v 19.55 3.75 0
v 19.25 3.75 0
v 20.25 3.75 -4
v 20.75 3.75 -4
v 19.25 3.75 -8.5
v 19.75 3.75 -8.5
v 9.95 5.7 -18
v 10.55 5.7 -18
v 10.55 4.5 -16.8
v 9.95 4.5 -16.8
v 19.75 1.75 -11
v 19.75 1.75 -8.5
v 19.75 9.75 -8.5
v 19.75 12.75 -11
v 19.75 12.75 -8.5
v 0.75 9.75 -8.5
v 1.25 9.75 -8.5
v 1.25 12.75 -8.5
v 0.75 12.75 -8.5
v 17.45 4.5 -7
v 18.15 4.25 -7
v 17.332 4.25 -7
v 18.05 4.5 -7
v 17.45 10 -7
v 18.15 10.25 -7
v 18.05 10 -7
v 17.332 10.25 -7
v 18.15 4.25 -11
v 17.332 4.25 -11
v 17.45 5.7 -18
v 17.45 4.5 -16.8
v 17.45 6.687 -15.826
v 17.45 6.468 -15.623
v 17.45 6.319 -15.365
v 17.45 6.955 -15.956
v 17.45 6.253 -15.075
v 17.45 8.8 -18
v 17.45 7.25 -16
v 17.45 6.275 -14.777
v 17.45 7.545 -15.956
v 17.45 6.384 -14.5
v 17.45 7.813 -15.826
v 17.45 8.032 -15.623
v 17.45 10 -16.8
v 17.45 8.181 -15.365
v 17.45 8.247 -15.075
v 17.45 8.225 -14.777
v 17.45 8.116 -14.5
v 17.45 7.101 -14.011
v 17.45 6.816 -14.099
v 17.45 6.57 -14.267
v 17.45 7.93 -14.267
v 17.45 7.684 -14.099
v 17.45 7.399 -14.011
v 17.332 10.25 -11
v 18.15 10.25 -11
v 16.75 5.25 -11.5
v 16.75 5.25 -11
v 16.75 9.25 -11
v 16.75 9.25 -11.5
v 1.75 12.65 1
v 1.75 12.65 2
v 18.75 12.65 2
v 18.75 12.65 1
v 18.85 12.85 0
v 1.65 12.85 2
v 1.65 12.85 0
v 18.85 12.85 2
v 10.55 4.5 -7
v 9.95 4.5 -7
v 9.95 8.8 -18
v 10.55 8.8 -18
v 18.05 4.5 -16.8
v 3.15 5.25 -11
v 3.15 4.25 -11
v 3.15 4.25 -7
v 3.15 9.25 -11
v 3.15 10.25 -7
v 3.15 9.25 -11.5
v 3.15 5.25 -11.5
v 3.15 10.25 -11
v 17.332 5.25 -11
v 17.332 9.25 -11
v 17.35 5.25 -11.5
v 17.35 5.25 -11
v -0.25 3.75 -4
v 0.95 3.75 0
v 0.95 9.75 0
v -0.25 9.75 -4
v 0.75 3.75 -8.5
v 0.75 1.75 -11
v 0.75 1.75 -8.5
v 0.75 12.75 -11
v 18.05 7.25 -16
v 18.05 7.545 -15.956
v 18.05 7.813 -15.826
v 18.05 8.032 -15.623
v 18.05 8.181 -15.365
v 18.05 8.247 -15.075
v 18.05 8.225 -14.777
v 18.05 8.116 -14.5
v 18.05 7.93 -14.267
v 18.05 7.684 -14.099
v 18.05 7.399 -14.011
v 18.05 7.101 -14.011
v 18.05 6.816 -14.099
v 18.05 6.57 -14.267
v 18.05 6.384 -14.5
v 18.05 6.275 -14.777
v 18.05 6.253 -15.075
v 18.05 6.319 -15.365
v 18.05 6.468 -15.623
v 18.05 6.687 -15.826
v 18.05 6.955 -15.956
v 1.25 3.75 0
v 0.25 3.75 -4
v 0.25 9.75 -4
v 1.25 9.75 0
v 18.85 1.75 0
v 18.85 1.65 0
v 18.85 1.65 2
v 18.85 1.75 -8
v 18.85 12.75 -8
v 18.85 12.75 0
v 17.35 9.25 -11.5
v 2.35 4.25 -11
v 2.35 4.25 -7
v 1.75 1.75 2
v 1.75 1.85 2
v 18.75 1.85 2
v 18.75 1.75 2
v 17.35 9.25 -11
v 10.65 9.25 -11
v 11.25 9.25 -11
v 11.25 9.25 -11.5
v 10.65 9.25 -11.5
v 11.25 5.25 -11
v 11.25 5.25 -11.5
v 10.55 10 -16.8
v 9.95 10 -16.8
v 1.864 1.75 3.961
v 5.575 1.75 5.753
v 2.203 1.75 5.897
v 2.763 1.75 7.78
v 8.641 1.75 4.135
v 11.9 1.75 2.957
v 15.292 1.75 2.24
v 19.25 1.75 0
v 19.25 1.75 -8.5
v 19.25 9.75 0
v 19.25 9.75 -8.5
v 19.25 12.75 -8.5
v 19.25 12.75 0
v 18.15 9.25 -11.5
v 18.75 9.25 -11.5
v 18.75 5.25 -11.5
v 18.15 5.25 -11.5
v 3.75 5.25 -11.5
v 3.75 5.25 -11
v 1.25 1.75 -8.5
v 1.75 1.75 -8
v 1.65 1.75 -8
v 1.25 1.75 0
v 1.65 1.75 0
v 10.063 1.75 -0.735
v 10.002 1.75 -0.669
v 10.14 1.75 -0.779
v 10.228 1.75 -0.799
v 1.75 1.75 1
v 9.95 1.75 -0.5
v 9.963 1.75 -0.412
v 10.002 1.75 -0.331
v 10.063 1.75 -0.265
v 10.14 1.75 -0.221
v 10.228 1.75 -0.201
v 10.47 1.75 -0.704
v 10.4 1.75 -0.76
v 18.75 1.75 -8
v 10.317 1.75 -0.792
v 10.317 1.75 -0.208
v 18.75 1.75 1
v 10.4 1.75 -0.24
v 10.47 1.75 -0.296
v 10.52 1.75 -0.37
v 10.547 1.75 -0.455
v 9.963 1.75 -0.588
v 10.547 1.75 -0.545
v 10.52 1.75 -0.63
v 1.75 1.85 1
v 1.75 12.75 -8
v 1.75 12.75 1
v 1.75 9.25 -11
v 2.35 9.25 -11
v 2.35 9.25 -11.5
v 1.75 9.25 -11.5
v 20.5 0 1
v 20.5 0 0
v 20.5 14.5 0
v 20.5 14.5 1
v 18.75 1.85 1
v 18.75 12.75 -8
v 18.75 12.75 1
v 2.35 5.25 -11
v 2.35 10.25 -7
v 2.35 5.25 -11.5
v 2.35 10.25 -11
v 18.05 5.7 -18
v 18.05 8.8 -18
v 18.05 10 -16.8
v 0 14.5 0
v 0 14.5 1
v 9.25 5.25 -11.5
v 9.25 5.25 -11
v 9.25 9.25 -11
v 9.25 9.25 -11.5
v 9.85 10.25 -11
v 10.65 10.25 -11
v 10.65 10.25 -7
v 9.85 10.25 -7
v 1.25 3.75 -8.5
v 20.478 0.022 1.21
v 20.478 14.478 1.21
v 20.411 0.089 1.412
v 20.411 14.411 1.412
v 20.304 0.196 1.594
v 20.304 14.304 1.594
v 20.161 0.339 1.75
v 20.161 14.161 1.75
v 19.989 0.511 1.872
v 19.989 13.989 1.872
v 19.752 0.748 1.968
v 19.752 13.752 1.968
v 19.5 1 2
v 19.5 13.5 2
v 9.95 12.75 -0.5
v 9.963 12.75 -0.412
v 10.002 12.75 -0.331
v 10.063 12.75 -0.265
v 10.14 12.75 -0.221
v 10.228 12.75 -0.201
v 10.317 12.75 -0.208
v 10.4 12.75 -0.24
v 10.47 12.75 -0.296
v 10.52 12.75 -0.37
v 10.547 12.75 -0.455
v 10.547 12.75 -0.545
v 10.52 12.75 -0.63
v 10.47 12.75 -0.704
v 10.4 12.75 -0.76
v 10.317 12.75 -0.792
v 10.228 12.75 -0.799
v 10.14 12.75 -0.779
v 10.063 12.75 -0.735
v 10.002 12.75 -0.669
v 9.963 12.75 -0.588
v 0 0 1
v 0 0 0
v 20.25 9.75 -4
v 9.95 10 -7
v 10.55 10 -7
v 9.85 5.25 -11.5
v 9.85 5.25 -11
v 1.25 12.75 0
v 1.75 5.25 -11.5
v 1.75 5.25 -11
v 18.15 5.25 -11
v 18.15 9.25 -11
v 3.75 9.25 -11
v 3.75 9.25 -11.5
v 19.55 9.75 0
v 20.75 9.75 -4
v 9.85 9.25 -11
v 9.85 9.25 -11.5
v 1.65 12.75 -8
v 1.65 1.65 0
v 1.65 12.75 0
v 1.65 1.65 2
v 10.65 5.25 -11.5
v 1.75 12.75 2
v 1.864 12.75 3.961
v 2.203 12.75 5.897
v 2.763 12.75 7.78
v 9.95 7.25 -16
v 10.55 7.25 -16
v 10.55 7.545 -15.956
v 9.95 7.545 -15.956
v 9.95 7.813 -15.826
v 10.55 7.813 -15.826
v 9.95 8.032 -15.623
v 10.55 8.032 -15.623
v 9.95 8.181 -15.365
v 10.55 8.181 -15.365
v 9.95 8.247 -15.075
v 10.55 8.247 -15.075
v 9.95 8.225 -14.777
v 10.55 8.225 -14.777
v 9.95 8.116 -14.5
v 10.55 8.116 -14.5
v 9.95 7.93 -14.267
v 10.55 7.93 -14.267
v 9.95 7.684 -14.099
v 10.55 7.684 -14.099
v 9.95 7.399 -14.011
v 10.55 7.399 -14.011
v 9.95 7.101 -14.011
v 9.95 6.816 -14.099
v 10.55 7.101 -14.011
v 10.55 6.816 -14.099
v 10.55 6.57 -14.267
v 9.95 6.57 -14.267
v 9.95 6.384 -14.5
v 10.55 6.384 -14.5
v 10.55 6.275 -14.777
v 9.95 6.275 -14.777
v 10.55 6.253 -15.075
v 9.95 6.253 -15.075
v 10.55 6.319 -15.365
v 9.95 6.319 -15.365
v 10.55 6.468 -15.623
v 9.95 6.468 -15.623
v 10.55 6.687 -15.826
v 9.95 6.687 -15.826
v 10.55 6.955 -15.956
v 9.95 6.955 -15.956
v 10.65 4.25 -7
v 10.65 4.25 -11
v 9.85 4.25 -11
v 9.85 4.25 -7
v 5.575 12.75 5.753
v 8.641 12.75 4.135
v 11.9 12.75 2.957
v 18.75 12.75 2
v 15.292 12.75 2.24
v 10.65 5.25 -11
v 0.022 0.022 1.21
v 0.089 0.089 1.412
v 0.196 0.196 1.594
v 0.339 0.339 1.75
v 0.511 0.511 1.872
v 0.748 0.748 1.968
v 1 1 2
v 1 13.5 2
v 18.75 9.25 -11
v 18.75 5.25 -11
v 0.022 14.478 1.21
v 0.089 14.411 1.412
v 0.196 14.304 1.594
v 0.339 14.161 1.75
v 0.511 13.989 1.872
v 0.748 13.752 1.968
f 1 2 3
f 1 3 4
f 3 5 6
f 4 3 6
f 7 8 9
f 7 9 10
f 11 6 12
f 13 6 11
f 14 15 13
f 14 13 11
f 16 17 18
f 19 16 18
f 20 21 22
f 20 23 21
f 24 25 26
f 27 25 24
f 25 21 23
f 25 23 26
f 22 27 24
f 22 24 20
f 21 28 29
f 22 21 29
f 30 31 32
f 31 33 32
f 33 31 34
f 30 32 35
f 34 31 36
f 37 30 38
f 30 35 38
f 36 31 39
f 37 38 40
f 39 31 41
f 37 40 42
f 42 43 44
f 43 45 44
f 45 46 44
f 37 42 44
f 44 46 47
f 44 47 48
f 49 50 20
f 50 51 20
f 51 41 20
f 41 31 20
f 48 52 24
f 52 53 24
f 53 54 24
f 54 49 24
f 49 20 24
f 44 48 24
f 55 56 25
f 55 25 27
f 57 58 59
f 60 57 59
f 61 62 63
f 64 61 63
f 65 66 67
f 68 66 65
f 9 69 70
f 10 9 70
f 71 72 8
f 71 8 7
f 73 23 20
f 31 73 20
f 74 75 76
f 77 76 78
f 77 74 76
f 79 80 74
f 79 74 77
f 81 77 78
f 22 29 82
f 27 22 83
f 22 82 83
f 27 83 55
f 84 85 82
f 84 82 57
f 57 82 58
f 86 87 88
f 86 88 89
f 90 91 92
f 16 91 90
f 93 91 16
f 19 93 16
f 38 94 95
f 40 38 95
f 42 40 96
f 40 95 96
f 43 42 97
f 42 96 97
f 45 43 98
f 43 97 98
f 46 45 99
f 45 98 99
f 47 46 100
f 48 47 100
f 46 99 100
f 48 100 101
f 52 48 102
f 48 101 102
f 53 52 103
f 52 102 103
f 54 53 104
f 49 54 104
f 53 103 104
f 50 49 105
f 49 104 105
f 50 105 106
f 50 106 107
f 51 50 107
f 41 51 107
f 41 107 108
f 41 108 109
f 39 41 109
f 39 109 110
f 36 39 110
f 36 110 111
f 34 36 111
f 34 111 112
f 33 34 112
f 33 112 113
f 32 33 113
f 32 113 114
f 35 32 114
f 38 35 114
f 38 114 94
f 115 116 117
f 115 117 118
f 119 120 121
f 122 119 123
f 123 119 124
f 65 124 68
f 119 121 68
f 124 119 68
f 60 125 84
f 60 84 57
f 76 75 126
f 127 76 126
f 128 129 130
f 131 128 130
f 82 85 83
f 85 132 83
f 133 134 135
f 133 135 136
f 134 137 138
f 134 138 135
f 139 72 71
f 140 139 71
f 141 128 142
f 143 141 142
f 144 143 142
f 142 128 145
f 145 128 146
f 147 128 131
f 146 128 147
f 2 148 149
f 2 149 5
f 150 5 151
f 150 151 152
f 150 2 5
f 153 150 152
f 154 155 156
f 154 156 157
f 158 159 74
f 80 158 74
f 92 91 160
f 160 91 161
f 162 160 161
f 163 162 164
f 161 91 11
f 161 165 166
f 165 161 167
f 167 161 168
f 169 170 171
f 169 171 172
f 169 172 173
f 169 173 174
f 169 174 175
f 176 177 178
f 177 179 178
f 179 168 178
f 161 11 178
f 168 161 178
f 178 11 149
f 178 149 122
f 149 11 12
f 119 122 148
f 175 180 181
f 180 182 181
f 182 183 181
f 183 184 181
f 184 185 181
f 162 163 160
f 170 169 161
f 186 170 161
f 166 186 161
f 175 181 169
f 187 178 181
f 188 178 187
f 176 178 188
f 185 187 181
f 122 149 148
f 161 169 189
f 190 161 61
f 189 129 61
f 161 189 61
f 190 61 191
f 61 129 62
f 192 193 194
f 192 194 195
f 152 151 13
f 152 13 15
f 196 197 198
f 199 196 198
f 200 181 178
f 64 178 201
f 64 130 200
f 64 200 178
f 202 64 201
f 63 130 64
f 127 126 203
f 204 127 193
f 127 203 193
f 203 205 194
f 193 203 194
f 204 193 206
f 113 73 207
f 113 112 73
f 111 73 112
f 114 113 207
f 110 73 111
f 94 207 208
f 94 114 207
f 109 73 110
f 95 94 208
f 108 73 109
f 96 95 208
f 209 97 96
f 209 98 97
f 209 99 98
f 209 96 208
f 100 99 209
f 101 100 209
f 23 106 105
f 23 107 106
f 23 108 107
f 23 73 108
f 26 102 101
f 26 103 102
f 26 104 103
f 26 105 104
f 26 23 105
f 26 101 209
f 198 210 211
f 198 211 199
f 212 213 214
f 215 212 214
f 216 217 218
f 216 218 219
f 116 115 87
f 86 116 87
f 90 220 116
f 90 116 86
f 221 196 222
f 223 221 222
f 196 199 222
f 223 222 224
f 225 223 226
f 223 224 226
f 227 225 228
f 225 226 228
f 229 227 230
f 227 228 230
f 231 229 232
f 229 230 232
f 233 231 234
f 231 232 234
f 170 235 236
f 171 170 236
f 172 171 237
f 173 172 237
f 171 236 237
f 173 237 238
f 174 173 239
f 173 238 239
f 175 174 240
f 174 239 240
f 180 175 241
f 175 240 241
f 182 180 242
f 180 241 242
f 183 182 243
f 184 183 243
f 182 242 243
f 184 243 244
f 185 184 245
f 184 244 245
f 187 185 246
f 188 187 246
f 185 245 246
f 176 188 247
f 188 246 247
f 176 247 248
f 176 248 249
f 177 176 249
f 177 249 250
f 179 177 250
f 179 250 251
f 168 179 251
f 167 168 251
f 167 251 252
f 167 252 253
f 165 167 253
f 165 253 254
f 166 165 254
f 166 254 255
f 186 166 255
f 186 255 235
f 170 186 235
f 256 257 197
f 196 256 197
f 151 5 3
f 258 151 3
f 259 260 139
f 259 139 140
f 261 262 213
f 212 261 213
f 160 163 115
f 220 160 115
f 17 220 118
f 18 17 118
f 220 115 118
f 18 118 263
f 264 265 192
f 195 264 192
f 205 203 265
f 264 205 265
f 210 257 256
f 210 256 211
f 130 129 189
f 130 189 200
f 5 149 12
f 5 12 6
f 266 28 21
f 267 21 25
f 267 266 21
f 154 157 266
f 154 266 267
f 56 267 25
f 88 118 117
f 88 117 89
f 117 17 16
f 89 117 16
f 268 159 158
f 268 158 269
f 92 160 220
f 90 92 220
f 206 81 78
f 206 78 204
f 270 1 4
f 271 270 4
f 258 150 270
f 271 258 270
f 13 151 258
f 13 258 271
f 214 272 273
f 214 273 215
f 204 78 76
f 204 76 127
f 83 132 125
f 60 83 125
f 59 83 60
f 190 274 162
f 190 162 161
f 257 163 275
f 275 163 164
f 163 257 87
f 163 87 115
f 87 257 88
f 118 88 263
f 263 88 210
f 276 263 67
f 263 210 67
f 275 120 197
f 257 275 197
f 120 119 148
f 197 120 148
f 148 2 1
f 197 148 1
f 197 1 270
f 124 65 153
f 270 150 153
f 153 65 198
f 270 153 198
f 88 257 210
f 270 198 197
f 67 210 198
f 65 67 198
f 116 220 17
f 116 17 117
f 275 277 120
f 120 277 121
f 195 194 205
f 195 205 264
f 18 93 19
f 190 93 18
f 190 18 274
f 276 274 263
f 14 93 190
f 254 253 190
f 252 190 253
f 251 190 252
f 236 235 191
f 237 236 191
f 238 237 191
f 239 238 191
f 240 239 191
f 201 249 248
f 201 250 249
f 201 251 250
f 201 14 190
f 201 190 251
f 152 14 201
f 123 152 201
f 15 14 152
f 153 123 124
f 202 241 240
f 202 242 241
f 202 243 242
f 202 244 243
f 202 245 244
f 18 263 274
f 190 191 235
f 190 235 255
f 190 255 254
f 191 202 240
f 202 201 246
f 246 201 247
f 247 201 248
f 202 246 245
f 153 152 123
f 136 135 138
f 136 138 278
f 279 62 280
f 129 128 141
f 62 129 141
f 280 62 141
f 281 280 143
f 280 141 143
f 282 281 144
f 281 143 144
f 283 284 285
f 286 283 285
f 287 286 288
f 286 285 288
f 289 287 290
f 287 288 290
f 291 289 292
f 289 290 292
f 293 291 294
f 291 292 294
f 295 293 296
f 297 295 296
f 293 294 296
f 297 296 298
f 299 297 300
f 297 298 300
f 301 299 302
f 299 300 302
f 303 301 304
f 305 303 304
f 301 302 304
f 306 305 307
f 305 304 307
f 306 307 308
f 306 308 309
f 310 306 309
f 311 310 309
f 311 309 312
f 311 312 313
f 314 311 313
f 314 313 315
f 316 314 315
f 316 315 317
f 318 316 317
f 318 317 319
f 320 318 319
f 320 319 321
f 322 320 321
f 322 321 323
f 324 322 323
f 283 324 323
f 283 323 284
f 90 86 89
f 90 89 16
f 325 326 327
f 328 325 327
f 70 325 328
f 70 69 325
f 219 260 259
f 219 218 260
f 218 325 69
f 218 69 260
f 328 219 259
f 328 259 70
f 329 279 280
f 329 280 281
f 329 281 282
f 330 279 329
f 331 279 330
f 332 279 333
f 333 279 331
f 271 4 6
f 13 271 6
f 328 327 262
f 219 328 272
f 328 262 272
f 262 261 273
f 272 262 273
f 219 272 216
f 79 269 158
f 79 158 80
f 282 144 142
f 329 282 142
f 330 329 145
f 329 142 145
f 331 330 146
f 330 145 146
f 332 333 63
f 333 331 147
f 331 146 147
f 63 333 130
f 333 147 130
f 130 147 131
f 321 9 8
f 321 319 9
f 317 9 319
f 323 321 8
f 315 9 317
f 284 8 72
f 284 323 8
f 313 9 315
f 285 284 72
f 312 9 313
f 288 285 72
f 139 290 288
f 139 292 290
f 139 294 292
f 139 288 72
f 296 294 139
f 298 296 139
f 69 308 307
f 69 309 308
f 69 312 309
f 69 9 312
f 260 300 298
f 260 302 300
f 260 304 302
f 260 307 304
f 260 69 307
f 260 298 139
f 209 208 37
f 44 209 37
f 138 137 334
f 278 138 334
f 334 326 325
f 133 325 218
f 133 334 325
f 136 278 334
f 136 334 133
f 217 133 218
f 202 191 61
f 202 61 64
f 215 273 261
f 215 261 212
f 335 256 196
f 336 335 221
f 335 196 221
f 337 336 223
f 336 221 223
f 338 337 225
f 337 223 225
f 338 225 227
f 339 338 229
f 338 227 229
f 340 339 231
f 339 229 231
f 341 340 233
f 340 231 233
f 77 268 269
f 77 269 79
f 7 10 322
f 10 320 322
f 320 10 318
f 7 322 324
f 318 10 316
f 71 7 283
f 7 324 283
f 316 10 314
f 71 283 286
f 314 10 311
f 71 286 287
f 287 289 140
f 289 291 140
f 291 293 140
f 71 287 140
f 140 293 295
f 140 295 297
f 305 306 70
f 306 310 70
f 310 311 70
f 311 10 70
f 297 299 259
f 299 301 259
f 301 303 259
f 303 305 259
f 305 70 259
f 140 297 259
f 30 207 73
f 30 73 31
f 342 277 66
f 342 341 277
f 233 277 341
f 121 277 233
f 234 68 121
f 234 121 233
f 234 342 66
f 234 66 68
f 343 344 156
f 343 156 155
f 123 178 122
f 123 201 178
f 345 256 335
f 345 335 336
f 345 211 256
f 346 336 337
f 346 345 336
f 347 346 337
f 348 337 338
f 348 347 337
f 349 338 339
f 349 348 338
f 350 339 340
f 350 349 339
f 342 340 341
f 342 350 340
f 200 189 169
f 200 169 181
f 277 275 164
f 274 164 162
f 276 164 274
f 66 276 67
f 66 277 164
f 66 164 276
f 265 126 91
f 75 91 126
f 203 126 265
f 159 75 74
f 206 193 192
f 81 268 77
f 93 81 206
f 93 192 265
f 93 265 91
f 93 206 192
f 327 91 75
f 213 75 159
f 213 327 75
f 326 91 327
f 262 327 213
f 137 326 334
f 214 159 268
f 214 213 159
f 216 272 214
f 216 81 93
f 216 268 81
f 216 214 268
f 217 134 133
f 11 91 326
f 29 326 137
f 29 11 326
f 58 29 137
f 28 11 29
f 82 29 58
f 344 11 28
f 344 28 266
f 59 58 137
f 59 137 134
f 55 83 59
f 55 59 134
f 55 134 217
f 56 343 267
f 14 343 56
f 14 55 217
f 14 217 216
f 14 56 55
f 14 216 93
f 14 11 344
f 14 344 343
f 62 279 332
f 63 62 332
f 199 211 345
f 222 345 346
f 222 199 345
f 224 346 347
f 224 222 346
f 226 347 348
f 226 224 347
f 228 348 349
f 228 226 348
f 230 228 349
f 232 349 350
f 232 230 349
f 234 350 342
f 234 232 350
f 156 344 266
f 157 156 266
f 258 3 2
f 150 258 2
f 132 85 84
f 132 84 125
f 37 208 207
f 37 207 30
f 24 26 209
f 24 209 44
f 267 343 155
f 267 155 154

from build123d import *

# Parameters (mm, degrees)
SKETCH_1_W          = 20.5
SKETCH_1_H          = 14.5
EXTRUDE_1_DEPTH     = 2
FILLET_1_R          = 1
SKETCH_2_W          = 18
SKETCH_2_H          = 11
EXTRUDE_2_DEPTH     = 11
SKETCH_3_W          = 2.5
SKETCH_3_H          = 11
EXTRUDE_3_DEPTH     = 0.5
SKETCH_4_W          = 2.5
SKETCH_4_H          = 11
EXTRUDE_4_DEPTH     = 0.5
SKETCH_5_R          = 0.3
CUT_EXTRUDE_1_DEPTH = 27.529464751
SKETCH_6_W          = 0.6
SKETCH_6_H          = 4
EXTRUDE_5_DEPTH     = 0.5
SKETCH_7_W          = 0.818024616
SKETCH_7_H          = 6
SKETCH_7_W_2        = 0.8
CUT_EXTRUDE_2_DEPTH = 4
SKETCH_8_W          = 0.6
SKETCH_8_H          = 5.5
EXTRUDE_6_DEPTH     = 11
CHAMFER_1_SIZE      = 1.2
SKETCH_9_R          = 1
CUT_EXTRUDE_3_DEPTH = 30.326651701
EXTRUDE_7_DEPTH     = 6
EXTRUDE_8_DEPTH     = 11
SKETCH_12_W         = 17.2
SKETCH_12_H         = 11.2
SKETCH_12_W_2       = 17
SKETCH_12_H_2       = 11
CUT_EXTRUDE_4_DEPTH = 10
SKETCH_13_W         = 17
SKETCH_13_H         = 0.1
CUT_EXTRUDE_5_DEPTH = 1


with BuildPart() as part:
    # 草图1 → 凸台-拉伸1 (new body)
    with BuildSketch(Plane.XY):
        with Locations((10.25, 7.25)):
            Rectangle(SKETCH_1_W, SKETCH_1_H)
    extrude(amount=EXTRUDE_1_DEPTH)

    # 圆角1
    fillet_1_edges = [part.edges().sort_by_distance(p)[0] for p in [
        (20.5, 7.25, 2),
        (10.25, 14.5, 2),
        (0, 7.25, 2),
        (10.25, 0, 2),
    ]]
    fillet(fillet_1_edges, radius=FILLET_1_R)

    # 草图2 → 凸台-拉伸2 (add)
    with BuildSketch(Plane(origin=(0, 0, 0), x_dir=(-1, 0, 0), z_dir=(0, 0, -1))):
        with Locations((-10.25, 7.25)):
            Rectangle(SKETCH_2_W, SKETCH_2_H)
    extrude(amount=EXTRUDE_2_DEPTH)

    # 草图3 → 凸台-拉伸3 (add)
    with BuildSketch(Plane(origin=(19.25, 0, 0), x_dir=(0, 0, -1), z_dir=(1, 0, 0))):
        with Locations((9.75, 7.25)):
            Rectangle(SKETCH_3_W, SKETCH_3_H)
    extrude(amount=EXTRUDE_3_DEPTH)

    # 草图4 → 凸台-拉伸4 (add)
    with BuildSketch(Plane.ZY.offset(-1.25)):
        with Locations((-9.75, 7.25)):
            Rectangle(SKETCH_4_W, SKETCH_4_H)
    extrude(amount=EXTRUDE_4_DEPTH)

    # 草图5 → 切除-拉伸1 (cut, through all)
    with BuildSketch(Plane(origin=(0, 12.75, 0), x_dir=(1, 0, 0), z_dir=(0, 1, 0))):
        with Locations(Location((10.25, 0.5, 0), (0, 0, 180))):
            Circle(SKETCH_5_R)
    extrude(amount=-CUT_EXTRUDE_1_DEPTH, mode=Mode.SUBTRACT)

    # 草图6 → 凸台-拉伸5 (add)
    with BuildSketch(Plane(origin=(0, 0, -11), x_dir=(-1, 0, 0), z_dir=(0, 0, -1))):
        with Locations((-18.45, 7.25)):
            Rectangle(SKETCH_6_W, SKETCH_6_H)
        with Locations((-17.05, 7.25)):
            Rectangle(SKETCH_6_W, SKETCH_6_H)
        with Locations((-10.95, 7.25)):
            Rectangle(SKETCH_6_W, SKETCH_6_H)
        with Locations((-9.55, 7.25)):
            Rectangle(SKETCH_6_W, SKETCH_6_H)
        with Locations((-3.45, 7.25)):
            Rectangle(SKETCH_6_W, SKETCH_6_H)
        with Locations((-2.05, 7.25)):
            Rectangle(SKETCH_6_W, SKETCH_6_H)
    extrude(amount=EXTRUDE_5_DEPTH)

    # 草图7 → 切除-拉伸2 (cut)
    with BuildSketch(Plane(origin=(0, 0, -11), x_dir=(-1, 0, 0), z_dir=(0, 0, -1))):
        with Locations((-17.740987692, 7.25)):
            Rectangle(SKETCH_7_W, SKETCH_7_H)
        with Locations((-10.25, 7.25)):
            Rectangle(SKETCH_7_W_2, SKETCH_7_H)
        with Locations((-2.75, 7.25)):
            Rectangle(SKETCH_7_W_2, SKETCH_7_H)
    extrude(amount=-CUT_EXTRUDE_2_DEPTH, mode=Mode.SUBTRACT)

    # 草图8 → 凸台-拉伸6 (add)
    with BuildSketch(Plane(origin=(0, 0, -7), x_dir=(-1, 0, 0), z_dir=(0, 0, -1))):
        with Locations((-17.75, 7.25)):
            Rectangle(SKETCH_8_W, SKETCH_8_H)
        with Locations((-10.25, 7.25)):
            Rectangle(SKETCH_8_W, SKETCH_8_H)
    extrude(amount=EXTRUDE_6_DEPTH)

    # 倒角1
    chamfer_1_edges = [part.edges().sort_by_distance(p)[0] for p in [
        (17.75, 4.5, -18),
        (17.75, 10, -18),
        (10.25, 4.5, -18),
        (10.25, 10, -18),
    ]]
    chamfer(chamfer_1_edges, length=CHAMFER_1_SIZE)

    # 草图9 → 切除-拉伸3 (cut, through all)
    with BuildSketch(Plane(origin=(18.05, 0, 0), x_dir=(0, 0, -1), z_dir=(1, 0, 0))):
        with Locations((15, 7.25)):
            Circle(SKETCH_9_R)
    extrude(amount=-CUT_EXTRUDE_3_DEPTH, mode=Mode.SUBTRACT)

    # 草图10 → 凸台-拉伸7 (add)
    with BuildSketch(Plane(origin=(0, 3.75, 0), x_dir=(-1, 0, 0), z_dir=(0, -1, 0))):
        Polygon((-19.25, 0), (-19.55, 0), (-20.75, 4), (-19.75, 8.5), (-19.25, 8.5), (-20.25, 4), align=None)
        Polygon((-1.25, 0), (-0.95, 0), (0.25, 4), (-0.75, 8.5), (-1.25, 8.5), (-0.25, 4), align=None)
    extrude(amount=-EXTRUDE_7_DEPTH)

    # 草图11 → 凸台-拉伸8 (add)
    with BuildSketch(Plane.XZ.offset(-1.75)):
        with BuildLine():
            Line((18.75, 2), (1.75, 2))
            ThreePointArc((1.75, 2), (2.005105989, 4.934028723), (2.762767594, 7.78))
            ThreePointArc((2.762767594, 7.78), (10.25, 3.489364109), (18.75, 2))
        make_face()
    extrude(amount=-EXTRUDE_8_DEPTH)

    # 草图12 → 切除-拉伸4 (cut)
    with BuildSketch(Plane.XY.offset(2)):
        with Locations((10.25, 7.25)):
            Rectangle(SKETCH_12_W, SKETCH_12_H)
        with Locations((10.25, 7.25)):
            Rectangle(SKETCH_12_W_2, SKETCH_12_H_2, mode=Mode.SUBTRACT)
    extrude(amount=-CUT_EXTRUDE_4_DEPTH, mode=Mode.SUBTRACT)

    # 草图13 → 切除-拉伸5 (cut)
    with BuildSketch(Plane.XY.offset(2)):
        with Locations((10.25, 1.8)):
            Rectangle(SKETCH_13_W, SKETCH_13_H)
        with Locations((10.25, 12.7)):
            Rectangle(SKETCH_13_W, SKETCH_13_H)
    extrude(amount=-CUT_EXTRUDE_5_DEPTH, mode=Mode.SUBTRACT)


solid = part.part
